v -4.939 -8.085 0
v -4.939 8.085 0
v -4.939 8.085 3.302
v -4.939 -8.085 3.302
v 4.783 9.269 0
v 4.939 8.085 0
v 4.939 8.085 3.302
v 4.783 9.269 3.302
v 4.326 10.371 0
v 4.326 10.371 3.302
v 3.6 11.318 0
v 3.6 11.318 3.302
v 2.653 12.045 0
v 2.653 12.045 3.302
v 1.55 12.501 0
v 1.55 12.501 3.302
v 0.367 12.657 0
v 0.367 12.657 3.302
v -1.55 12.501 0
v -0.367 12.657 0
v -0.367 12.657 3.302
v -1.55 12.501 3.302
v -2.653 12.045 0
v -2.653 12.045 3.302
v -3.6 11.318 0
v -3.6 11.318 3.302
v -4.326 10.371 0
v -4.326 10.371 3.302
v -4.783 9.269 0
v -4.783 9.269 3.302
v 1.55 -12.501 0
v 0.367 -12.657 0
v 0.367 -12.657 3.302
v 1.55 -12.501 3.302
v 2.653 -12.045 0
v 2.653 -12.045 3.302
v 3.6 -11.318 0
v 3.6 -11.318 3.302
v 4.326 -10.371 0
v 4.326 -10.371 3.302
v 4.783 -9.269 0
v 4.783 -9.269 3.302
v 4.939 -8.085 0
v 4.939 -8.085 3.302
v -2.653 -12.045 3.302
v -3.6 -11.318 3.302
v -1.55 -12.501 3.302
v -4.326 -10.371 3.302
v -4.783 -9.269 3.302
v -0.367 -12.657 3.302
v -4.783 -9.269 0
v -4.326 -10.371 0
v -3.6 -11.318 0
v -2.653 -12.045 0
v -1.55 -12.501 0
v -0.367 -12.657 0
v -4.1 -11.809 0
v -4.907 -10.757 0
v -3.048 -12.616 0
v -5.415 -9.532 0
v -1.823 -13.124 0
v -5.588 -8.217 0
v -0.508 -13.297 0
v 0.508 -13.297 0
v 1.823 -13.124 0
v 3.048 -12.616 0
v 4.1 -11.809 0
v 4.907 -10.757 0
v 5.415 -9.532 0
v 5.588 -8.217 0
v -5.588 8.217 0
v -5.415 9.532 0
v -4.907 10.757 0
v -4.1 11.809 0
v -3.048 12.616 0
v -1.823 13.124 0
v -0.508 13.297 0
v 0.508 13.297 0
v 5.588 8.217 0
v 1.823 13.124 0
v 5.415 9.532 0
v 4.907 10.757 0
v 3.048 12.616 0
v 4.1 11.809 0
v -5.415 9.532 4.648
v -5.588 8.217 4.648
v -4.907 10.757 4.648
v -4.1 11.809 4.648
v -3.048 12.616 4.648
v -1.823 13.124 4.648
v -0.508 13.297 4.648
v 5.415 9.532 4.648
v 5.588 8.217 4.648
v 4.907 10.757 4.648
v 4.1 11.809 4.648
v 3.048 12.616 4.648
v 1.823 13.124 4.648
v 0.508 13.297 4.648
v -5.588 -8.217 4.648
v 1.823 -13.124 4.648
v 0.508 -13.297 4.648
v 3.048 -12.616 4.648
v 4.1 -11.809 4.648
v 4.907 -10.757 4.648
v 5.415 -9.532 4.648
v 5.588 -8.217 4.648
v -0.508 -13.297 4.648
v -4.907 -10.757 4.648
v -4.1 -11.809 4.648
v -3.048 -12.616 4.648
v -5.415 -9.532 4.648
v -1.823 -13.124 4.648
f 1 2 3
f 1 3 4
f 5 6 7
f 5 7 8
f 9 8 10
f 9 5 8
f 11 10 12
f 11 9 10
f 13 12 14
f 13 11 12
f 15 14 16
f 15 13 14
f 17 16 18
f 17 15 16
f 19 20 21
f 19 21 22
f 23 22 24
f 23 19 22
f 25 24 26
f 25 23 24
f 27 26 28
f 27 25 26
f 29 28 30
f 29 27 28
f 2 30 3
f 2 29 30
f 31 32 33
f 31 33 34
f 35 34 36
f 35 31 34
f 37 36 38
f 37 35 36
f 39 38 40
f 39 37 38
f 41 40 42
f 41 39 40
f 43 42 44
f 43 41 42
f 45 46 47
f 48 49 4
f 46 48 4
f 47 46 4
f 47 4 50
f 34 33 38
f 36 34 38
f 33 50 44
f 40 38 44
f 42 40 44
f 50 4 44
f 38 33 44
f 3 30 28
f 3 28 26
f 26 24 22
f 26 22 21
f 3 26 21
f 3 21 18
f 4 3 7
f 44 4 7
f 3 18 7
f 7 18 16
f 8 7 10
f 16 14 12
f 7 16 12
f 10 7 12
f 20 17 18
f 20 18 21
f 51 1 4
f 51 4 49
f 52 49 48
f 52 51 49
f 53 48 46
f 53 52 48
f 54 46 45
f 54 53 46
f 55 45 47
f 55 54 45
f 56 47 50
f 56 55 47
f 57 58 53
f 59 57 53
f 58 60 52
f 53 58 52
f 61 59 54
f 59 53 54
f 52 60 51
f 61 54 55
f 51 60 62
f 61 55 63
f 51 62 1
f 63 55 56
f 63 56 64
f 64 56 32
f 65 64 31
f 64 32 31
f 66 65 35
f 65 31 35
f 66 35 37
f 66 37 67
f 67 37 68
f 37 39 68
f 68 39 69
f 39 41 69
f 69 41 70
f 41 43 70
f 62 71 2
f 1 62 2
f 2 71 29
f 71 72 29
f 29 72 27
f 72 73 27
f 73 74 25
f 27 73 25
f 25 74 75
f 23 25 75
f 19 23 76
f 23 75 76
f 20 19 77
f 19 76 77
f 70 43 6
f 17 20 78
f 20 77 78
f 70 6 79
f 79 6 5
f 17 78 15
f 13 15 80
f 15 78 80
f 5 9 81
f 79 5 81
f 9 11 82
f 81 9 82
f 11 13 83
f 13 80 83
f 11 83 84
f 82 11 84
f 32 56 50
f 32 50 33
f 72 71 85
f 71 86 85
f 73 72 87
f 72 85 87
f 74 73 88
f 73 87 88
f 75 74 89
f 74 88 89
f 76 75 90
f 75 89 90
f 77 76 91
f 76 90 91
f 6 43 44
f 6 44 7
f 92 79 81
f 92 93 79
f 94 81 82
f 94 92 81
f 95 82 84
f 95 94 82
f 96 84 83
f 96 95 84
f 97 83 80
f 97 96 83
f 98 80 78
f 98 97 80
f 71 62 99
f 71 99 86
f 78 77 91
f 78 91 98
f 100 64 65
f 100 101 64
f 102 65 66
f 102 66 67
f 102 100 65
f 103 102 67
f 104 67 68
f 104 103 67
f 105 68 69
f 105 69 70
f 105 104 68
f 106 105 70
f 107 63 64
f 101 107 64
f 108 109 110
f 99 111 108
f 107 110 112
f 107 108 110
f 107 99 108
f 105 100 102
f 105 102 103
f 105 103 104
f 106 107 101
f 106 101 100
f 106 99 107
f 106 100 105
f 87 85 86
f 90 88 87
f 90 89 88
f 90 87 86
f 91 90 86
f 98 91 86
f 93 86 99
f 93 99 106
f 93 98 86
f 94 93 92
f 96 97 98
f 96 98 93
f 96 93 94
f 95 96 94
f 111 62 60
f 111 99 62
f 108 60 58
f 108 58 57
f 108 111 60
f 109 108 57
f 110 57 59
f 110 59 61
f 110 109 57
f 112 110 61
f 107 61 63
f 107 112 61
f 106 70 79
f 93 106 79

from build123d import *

# Parameters (mm, degrees)
F0_W     = 11.176
F0_H     = 26.5938
F1_DEPTH = 4.6482
F2_R     = 5.08
F4_DEPTH = 3.302


with BuildPart() as f1:
    # F0 (on Top) → F1 (new body)
    with BuildSketch(Plane.XY):
        Rectangle(F0_W, F0_H)
    extrude(amount=F1_DEPTH)

    # F2
    f2_edges = [f1.edges().sort_by_distance(p)[0] for p in [
        (-5.588, 13.2969, 2.3241),
        (5.588, 13.2969, 2.3241),
        (-5.588, -13.2969, 2.3241),
        (5.588, -13.2969, 2.3241),
    ]]
    fillet(f2_edges, radius=F2_R)

    # F3 (on face) → F4 (cut)
    with BuildSketch(Plane.XY):
        with BuildLine():
            Line((-4.938699, 8.085186), (-4.938699, -8.085186))
            ThreePointArc((-4.938699, -8.085186), (-3.599592, -11.318078), (-0.366699, -12.657186))
            Line((-0.366699, -12.657186), (0.366699, -12.657186))
            ThreePointArc((0.366699, -12.657186), (3.599592, -11.318078), (4.938699, -8.085186))
            Line((4.938699, -8.085186), (4.938699, 8.085186))
            ThreePointArc((4.938699, 8.085186), (3.599592, 11.318078), (0.366699, 12.657186))
            Line((0.366699, 12.657186), (-0.366699, 12.657186))
            ThreePointArc((-0.366699, 12.657186), (-3.599592, 11.318078), (-4.938699, 8.085186))
        make_face()
    extrude(amount=F4_DEPTH, mode=Mode.SUBTRACT)


solid = f1.part
